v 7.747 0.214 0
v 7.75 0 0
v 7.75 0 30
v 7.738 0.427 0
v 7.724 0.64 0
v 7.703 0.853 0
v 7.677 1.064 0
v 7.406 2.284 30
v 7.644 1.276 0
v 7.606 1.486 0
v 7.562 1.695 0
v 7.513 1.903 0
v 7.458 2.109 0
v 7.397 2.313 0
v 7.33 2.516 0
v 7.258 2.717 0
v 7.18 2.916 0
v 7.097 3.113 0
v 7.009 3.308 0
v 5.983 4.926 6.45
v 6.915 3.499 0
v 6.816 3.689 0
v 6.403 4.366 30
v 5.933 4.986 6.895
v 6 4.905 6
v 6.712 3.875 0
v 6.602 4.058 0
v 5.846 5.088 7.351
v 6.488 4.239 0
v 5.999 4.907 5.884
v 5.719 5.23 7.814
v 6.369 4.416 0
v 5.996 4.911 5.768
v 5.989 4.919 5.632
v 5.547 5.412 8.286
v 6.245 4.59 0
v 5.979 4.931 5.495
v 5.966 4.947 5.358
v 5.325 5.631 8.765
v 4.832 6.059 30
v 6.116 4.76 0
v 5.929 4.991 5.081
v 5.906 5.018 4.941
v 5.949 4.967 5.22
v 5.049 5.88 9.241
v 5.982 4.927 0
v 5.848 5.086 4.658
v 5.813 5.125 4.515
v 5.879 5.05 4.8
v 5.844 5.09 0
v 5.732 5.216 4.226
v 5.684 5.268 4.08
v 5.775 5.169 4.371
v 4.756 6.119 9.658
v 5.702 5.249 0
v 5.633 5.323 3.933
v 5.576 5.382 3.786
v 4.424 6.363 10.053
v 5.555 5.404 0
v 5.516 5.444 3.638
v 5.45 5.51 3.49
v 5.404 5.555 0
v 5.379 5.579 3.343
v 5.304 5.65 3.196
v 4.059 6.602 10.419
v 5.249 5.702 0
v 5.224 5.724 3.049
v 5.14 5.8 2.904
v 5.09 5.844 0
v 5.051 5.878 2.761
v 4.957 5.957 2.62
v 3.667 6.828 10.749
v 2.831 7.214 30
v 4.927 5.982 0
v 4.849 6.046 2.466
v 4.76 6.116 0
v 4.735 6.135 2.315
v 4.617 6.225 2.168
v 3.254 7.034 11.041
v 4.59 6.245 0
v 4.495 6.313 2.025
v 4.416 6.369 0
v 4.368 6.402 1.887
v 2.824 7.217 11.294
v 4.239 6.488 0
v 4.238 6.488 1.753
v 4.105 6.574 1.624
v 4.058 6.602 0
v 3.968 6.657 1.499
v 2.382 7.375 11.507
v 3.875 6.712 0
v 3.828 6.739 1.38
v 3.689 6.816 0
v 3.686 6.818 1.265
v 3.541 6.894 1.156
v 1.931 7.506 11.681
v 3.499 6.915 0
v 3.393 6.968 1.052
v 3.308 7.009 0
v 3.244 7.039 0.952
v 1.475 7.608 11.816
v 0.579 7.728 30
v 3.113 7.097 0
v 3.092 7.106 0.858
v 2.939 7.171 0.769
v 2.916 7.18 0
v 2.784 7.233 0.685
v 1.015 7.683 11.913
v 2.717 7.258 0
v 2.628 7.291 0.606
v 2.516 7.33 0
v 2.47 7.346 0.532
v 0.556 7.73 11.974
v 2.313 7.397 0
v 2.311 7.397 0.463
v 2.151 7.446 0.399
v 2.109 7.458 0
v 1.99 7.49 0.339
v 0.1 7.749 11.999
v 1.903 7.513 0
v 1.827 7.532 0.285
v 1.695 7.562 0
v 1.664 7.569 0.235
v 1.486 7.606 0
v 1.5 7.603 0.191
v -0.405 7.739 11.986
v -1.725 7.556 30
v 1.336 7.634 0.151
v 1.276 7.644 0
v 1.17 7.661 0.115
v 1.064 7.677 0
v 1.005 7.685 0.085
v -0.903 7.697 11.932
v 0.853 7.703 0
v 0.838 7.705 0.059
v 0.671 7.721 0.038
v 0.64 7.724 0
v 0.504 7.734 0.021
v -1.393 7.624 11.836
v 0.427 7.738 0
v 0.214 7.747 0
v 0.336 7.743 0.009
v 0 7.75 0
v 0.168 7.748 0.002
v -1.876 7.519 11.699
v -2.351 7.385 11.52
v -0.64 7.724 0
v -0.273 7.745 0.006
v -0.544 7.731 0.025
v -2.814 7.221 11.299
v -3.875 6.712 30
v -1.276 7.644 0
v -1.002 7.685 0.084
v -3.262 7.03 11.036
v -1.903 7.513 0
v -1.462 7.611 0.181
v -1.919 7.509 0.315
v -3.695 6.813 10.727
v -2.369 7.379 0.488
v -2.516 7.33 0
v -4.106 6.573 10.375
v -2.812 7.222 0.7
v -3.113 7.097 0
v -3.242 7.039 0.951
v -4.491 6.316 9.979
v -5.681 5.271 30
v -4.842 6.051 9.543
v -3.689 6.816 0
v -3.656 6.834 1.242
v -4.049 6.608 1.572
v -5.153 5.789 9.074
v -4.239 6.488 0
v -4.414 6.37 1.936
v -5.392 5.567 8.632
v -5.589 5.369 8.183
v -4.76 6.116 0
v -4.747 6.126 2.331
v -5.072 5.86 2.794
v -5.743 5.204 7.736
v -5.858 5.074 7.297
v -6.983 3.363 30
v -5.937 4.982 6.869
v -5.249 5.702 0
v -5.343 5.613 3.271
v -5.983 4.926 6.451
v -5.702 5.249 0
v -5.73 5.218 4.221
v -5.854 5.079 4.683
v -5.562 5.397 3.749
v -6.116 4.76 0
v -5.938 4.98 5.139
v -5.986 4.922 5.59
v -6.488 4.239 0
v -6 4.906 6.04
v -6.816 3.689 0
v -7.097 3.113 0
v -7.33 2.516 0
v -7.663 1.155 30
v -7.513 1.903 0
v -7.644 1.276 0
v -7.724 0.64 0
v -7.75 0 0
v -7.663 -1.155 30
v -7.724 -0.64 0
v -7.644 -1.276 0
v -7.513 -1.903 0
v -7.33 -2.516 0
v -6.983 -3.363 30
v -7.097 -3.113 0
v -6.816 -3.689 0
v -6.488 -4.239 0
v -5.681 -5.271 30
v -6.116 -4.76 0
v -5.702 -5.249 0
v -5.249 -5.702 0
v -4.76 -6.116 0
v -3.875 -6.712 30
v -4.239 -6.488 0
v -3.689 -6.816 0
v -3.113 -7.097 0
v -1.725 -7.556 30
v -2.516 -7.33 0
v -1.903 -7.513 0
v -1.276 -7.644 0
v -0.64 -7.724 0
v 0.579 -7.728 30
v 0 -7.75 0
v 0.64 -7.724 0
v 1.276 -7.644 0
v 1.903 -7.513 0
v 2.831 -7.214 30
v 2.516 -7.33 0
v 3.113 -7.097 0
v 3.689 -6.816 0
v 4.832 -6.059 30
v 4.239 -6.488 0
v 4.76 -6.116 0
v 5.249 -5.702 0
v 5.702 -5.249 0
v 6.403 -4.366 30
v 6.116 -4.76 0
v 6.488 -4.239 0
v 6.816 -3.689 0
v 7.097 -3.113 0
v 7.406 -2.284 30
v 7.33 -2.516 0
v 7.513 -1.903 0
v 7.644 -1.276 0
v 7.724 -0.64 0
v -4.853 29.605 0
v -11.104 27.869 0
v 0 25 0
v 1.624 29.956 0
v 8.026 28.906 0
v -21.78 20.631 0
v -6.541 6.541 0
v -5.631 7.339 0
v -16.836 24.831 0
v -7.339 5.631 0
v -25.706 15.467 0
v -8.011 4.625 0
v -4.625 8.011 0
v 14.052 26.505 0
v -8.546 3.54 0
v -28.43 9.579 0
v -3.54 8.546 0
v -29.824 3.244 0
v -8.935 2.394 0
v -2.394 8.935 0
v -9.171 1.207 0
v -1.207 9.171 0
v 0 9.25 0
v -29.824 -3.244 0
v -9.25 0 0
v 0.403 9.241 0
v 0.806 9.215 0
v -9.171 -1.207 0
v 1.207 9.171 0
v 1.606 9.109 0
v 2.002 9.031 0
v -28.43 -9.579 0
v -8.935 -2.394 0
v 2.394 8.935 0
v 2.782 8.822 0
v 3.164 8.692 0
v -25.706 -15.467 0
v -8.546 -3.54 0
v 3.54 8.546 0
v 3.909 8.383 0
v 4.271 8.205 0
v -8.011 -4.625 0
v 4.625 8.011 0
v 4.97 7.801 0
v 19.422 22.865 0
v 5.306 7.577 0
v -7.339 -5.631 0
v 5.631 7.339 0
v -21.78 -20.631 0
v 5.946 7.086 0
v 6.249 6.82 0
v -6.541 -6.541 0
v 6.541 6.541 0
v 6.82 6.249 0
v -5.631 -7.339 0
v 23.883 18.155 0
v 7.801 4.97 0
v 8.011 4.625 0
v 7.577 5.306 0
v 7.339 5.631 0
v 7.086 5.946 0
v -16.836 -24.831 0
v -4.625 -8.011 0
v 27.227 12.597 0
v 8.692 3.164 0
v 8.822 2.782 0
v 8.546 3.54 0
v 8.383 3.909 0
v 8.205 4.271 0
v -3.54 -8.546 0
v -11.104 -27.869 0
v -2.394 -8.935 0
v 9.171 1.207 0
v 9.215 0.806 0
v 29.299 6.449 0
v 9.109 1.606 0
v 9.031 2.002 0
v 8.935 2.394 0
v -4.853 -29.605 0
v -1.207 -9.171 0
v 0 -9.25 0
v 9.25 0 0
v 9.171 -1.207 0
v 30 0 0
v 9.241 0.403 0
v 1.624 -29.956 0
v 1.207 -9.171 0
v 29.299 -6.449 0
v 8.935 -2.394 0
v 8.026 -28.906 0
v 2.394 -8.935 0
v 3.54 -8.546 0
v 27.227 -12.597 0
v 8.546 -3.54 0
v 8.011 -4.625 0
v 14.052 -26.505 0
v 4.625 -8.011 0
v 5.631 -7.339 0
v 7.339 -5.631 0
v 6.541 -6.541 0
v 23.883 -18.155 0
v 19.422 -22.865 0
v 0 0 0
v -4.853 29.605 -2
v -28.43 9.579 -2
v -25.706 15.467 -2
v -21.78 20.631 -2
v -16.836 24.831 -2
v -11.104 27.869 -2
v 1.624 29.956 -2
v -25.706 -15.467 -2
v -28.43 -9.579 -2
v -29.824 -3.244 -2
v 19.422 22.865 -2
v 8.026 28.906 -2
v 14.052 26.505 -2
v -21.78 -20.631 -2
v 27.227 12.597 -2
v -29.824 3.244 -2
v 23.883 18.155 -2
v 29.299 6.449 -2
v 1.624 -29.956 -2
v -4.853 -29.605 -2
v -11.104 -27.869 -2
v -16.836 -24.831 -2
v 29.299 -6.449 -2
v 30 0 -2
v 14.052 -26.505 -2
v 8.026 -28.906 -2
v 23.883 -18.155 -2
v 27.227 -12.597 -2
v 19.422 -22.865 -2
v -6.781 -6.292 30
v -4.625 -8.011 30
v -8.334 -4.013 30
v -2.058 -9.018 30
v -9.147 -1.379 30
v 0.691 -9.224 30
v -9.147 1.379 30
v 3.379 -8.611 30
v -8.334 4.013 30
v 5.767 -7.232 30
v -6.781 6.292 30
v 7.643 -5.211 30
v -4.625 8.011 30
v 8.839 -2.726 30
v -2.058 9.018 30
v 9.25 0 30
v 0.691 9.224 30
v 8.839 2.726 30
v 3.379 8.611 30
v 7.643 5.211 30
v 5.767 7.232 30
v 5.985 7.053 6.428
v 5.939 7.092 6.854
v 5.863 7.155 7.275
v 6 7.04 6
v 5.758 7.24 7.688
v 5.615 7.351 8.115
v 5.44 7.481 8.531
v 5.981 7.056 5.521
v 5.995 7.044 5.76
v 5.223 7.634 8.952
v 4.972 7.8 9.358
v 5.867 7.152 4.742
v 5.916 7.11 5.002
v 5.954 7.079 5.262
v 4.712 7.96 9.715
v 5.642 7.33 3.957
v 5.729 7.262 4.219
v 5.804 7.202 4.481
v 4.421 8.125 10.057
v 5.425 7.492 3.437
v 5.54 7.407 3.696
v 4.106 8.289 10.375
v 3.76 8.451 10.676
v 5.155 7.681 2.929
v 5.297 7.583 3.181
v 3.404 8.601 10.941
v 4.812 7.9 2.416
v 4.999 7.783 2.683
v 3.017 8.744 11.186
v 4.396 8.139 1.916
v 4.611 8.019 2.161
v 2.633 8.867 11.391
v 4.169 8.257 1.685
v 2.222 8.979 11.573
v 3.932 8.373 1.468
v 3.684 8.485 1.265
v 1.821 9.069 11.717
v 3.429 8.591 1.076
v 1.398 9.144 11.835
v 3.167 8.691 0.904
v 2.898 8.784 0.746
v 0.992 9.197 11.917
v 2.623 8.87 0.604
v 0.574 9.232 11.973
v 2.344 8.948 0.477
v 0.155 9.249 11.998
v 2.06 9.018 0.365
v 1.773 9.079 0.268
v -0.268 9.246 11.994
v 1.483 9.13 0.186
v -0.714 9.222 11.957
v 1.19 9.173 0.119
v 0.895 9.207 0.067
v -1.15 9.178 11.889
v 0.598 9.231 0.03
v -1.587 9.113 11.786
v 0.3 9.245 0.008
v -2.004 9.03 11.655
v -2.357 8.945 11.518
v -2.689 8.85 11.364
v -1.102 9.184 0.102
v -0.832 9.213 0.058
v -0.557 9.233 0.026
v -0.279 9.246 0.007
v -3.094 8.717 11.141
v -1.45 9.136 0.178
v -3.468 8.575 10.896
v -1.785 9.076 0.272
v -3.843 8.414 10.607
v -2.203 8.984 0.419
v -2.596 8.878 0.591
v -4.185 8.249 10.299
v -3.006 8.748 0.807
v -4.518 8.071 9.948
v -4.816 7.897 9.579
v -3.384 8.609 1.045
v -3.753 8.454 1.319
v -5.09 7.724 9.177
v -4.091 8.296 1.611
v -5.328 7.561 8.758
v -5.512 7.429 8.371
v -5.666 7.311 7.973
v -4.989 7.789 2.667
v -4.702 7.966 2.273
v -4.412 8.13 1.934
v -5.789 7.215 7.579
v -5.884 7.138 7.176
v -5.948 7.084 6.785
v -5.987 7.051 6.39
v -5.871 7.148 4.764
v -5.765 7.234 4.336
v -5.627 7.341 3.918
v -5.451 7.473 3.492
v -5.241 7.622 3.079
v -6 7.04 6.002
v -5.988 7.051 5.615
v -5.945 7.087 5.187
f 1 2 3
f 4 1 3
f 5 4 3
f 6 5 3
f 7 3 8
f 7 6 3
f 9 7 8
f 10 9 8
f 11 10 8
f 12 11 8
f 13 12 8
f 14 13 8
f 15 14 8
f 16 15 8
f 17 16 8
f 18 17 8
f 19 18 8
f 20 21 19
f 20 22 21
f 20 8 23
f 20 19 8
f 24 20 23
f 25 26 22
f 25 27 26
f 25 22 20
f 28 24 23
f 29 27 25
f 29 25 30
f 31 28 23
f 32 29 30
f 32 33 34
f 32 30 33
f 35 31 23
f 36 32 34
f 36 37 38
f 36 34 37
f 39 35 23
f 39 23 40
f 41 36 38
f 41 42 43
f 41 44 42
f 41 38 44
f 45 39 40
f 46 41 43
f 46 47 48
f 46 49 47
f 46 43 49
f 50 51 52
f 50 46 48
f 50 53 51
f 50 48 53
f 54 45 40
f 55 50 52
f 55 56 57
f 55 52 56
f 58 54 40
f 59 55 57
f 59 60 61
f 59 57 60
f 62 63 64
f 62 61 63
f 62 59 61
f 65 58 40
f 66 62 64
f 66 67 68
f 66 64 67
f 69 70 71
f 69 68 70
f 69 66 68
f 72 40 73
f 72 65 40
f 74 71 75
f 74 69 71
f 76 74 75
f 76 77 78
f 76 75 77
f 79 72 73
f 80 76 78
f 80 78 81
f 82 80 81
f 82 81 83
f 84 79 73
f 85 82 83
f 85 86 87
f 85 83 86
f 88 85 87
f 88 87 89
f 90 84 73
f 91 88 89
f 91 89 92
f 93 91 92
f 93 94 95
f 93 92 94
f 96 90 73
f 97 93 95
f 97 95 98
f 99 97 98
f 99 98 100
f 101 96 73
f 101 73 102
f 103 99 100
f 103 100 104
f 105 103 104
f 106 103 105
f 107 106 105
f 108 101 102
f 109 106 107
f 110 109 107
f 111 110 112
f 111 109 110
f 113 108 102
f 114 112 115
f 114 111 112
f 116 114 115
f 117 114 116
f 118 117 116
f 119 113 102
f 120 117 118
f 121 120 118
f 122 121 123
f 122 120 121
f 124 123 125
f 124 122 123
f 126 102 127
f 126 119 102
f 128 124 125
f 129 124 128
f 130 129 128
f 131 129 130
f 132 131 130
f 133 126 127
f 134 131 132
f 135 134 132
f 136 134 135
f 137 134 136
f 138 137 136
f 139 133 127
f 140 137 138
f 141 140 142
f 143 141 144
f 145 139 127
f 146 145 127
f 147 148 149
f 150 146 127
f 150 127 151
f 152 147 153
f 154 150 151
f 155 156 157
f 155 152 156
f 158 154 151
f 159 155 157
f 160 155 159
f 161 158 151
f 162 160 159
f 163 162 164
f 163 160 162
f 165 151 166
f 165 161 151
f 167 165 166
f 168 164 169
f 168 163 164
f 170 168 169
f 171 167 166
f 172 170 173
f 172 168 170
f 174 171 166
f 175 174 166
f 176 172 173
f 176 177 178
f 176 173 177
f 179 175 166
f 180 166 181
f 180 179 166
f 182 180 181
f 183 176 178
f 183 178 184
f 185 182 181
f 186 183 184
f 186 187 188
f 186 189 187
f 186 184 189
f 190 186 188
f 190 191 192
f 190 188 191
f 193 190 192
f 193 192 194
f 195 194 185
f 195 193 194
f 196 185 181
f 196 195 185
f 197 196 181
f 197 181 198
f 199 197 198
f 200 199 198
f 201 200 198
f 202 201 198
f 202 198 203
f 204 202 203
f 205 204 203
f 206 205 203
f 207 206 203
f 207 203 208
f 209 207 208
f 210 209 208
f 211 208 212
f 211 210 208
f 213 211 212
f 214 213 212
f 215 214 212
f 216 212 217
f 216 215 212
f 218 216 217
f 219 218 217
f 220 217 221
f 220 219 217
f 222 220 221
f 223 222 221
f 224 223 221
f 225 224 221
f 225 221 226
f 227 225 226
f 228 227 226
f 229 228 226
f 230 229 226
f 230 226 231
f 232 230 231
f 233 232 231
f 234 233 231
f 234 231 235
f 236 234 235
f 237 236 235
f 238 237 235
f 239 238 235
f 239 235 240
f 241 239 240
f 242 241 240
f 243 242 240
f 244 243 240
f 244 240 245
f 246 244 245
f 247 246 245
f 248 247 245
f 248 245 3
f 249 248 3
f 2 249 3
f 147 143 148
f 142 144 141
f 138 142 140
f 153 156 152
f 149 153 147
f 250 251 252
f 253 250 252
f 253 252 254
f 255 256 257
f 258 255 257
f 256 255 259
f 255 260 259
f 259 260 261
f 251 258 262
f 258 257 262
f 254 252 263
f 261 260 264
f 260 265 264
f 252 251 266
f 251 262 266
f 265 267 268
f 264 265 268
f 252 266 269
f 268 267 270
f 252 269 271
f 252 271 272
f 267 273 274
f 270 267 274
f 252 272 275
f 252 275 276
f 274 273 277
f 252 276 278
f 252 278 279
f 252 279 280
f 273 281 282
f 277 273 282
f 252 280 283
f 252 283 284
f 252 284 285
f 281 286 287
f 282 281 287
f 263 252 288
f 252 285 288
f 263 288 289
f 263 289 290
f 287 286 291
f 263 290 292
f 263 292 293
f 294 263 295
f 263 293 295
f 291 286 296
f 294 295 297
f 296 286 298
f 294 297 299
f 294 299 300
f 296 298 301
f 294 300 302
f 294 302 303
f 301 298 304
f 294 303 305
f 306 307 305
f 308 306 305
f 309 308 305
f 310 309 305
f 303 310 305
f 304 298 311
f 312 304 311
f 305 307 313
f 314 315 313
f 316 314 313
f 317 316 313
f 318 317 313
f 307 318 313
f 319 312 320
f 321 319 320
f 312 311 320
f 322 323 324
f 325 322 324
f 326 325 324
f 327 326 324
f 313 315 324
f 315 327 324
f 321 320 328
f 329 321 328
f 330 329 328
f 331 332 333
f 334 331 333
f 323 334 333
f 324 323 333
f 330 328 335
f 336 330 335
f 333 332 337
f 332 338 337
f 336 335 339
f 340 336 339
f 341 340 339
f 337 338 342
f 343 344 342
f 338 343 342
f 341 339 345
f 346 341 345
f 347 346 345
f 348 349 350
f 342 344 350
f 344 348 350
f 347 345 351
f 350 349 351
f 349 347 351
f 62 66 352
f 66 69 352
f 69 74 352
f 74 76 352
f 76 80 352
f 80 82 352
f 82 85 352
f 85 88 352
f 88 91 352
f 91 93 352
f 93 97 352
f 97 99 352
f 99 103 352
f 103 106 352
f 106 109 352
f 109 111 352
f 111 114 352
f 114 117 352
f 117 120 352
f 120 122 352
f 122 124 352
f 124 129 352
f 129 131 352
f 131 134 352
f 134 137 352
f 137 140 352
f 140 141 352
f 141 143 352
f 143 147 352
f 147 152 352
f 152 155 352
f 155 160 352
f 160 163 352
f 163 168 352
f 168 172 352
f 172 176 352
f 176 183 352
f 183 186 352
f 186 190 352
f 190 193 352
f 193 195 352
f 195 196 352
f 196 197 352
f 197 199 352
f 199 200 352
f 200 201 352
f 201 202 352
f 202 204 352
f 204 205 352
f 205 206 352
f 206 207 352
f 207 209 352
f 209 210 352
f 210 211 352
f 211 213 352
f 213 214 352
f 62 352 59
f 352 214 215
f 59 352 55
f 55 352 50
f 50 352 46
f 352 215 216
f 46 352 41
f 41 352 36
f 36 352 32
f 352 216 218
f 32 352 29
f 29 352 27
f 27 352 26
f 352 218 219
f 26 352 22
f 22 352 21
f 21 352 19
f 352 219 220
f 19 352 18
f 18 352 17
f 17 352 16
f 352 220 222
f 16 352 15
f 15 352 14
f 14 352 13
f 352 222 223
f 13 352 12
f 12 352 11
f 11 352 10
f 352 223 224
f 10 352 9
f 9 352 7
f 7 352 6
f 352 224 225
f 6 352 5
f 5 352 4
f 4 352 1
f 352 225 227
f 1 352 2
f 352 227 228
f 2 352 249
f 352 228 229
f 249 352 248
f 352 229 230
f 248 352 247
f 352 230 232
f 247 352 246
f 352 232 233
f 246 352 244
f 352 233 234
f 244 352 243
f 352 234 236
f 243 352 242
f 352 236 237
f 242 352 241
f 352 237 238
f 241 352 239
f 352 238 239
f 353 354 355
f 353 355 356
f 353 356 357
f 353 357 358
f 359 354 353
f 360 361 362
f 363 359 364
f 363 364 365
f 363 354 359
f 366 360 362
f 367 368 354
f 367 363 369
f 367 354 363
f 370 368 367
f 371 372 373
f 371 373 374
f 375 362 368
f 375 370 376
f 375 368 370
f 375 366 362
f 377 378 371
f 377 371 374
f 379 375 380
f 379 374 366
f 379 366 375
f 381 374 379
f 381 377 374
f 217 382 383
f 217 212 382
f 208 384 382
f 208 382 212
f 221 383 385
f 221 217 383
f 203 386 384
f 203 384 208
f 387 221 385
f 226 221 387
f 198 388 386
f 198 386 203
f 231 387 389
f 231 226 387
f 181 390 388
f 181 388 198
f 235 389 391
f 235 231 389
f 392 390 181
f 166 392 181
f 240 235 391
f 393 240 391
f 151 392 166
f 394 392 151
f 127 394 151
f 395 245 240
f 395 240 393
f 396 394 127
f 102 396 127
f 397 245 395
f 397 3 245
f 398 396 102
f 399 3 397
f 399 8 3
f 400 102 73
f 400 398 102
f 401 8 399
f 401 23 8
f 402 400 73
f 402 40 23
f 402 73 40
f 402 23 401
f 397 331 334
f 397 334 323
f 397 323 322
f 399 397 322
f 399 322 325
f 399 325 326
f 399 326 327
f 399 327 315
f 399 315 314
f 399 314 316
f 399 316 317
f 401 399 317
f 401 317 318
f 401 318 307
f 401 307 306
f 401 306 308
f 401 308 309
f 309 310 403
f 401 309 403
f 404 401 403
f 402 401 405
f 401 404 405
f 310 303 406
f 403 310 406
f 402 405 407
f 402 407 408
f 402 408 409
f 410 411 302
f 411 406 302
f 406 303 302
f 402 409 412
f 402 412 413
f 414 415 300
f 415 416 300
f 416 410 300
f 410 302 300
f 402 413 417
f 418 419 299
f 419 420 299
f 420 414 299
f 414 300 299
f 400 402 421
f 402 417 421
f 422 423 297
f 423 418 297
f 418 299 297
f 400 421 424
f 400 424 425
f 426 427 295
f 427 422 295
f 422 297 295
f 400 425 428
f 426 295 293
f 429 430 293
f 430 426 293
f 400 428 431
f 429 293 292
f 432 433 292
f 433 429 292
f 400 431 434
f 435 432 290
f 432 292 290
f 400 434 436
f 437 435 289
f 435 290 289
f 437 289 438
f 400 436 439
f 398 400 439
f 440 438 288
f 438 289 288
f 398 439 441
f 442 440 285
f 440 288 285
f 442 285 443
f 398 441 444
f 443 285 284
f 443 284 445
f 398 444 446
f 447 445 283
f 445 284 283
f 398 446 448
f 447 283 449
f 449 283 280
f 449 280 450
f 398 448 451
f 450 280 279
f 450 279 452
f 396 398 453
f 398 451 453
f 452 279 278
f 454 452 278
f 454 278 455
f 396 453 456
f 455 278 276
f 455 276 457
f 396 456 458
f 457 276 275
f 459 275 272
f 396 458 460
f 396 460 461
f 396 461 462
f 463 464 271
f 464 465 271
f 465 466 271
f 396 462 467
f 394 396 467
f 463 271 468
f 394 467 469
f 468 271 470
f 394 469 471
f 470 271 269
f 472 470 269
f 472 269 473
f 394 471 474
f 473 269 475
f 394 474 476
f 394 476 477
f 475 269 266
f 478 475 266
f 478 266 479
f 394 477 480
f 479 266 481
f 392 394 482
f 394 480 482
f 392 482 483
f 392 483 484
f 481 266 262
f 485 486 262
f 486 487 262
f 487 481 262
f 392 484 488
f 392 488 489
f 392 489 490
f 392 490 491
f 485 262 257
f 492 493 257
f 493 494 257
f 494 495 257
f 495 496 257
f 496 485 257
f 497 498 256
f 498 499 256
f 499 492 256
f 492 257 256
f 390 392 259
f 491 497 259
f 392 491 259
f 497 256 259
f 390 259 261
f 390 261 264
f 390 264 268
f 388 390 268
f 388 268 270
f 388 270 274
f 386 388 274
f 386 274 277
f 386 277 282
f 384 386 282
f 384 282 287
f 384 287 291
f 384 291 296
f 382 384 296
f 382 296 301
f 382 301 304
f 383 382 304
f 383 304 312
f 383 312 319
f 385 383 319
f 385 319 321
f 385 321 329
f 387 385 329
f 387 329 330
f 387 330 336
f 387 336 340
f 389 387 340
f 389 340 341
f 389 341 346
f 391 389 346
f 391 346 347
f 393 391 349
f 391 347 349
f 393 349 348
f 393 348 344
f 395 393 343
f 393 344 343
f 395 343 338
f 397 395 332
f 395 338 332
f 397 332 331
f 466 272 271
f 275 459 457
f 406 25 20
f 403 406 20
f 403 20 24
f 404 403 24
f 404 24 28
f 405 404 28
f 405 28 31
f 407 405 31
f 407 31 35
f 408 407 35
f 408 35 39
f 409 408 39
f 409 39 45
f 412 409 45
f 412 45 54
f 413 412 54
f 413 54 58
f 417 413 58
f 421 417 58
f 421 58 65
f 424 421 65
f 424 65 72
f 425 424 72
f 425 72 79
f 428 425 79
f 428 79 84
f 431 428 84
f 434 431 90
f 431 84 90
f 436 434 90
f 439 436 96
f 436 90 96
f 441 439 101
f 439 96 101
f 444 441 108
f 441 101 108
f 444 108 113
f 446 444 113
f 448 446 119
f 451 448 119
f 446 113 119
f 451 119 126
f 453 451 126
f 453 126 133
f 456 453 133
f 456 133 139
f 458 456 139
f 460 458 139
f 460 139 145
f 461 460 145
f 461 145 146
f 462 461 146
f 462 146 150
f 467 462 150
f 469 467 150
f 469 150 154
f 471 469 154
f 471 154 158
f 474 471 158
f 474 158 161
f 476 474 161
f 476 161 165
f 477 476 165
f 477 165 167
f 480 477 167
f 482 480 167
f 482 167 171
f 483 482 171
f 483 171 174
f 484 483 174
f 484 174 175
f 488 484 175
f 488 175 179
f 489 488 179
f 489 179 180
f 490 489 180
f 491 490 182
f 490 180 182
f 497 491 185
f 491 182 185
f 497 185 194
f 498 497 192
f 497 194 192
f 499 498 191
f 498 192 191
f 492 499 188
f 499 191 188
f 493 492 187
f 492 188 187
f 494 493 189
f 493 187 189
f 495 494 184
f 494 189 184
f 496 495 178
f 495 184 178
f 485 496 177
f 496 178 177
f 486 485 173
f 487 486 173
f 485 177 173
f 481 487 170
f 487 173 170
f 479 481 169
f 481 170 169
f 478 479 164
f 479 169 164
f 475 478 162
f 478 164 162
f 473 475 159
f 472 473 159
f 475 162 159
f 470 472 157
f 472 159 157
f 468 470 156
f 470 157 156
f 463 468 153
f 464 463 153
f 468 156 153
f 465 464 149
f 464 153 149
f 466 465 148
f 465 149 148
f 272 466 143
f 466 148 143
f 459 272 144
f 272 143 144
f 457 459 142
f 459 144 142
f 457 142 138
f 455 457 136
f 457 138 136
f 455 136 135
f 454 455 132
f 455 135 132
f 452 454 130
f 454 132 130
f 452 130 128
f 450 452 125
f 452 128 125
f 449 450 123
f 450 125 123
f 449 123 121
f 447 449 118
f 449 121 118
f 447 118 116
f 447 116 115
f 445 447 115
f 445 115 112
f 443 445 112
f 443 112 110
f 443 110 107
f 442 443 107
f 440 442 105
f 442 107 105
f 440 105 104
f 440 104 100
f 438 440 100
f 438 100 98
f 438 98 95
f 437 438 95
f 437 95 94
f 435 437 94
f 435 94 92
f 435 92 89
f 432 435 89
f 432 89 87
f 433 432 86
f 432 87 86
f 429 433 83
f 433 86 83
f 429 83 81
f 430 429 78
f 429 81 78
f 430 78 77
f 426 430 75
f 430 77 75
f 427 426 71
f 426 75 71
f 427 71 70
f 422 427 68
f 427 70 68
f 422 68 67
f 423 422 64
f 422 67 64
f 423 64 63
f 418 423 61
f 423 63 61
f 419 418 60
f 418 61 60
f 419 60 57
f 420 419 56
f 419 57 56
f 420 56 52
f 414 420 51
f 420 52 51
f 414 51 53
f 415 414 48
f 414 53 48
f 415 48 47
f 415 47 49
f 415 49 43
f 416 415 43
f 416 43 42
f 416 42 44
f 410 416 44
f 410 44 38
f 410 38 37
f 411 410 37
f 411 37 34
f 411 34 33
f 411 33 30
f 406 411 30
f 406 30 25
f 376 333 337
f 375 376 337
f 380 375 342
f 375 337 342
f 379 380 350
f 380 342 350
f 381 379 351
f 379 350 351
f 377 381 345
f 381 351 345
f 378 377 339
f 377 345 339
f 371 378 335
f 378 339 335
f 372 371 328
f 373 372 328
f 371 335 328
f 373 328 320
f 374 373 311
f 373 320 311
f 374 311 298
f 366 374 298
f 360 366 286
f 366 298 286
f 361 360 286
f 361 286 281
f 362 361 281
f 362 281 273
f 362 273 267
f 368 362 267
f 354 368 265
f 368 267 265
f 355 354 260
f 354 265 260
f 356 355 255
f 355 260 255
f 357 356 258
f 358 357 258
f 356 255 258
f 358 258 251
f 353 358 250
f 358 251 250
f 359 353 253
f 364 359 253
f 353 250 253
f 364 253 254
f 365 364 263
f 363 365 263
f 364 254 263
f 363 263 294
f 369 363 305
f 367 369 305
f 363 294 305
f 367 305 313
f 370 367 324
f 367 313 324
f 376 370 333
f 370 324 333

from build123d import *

# Parameters (mm, degrees)
F0_R     = 9.25
F0_R_2   = 7.75
F1_DEPTH = 30
F2_R     = 30
F3_DEPTH = 2
F4_R     = 6
F5_DEPTH = 25


with BuildPart() as f1:
    # F0 (on Top) → F1 (new body)
    with BuildSketch(Plane.XY):
        Circle(F0_R)
        Circle(F0_R_2, mode=Mode.SUBTRACT)
    extrude(amount=F1_DEPTH)

    # F2 (on face) → F3 (join)
    with BuildSketch(Plane(origin=(0, 0, 0), x_dir=(1, 0, 0), z_dir=(0, 0, -1))):
        Circle(F2_R)
    extrude(amount=F3_DEPTH)

    # F4 (on Front) → F5 (cut)
    with BuildSketch(Plane.XZ):
        with Locations((0, 6)):
            Circle(F4_R)
    extrude(amount=-F5_DEPTH, mode=Mode.SUBTRACT)


solid = f1.part
